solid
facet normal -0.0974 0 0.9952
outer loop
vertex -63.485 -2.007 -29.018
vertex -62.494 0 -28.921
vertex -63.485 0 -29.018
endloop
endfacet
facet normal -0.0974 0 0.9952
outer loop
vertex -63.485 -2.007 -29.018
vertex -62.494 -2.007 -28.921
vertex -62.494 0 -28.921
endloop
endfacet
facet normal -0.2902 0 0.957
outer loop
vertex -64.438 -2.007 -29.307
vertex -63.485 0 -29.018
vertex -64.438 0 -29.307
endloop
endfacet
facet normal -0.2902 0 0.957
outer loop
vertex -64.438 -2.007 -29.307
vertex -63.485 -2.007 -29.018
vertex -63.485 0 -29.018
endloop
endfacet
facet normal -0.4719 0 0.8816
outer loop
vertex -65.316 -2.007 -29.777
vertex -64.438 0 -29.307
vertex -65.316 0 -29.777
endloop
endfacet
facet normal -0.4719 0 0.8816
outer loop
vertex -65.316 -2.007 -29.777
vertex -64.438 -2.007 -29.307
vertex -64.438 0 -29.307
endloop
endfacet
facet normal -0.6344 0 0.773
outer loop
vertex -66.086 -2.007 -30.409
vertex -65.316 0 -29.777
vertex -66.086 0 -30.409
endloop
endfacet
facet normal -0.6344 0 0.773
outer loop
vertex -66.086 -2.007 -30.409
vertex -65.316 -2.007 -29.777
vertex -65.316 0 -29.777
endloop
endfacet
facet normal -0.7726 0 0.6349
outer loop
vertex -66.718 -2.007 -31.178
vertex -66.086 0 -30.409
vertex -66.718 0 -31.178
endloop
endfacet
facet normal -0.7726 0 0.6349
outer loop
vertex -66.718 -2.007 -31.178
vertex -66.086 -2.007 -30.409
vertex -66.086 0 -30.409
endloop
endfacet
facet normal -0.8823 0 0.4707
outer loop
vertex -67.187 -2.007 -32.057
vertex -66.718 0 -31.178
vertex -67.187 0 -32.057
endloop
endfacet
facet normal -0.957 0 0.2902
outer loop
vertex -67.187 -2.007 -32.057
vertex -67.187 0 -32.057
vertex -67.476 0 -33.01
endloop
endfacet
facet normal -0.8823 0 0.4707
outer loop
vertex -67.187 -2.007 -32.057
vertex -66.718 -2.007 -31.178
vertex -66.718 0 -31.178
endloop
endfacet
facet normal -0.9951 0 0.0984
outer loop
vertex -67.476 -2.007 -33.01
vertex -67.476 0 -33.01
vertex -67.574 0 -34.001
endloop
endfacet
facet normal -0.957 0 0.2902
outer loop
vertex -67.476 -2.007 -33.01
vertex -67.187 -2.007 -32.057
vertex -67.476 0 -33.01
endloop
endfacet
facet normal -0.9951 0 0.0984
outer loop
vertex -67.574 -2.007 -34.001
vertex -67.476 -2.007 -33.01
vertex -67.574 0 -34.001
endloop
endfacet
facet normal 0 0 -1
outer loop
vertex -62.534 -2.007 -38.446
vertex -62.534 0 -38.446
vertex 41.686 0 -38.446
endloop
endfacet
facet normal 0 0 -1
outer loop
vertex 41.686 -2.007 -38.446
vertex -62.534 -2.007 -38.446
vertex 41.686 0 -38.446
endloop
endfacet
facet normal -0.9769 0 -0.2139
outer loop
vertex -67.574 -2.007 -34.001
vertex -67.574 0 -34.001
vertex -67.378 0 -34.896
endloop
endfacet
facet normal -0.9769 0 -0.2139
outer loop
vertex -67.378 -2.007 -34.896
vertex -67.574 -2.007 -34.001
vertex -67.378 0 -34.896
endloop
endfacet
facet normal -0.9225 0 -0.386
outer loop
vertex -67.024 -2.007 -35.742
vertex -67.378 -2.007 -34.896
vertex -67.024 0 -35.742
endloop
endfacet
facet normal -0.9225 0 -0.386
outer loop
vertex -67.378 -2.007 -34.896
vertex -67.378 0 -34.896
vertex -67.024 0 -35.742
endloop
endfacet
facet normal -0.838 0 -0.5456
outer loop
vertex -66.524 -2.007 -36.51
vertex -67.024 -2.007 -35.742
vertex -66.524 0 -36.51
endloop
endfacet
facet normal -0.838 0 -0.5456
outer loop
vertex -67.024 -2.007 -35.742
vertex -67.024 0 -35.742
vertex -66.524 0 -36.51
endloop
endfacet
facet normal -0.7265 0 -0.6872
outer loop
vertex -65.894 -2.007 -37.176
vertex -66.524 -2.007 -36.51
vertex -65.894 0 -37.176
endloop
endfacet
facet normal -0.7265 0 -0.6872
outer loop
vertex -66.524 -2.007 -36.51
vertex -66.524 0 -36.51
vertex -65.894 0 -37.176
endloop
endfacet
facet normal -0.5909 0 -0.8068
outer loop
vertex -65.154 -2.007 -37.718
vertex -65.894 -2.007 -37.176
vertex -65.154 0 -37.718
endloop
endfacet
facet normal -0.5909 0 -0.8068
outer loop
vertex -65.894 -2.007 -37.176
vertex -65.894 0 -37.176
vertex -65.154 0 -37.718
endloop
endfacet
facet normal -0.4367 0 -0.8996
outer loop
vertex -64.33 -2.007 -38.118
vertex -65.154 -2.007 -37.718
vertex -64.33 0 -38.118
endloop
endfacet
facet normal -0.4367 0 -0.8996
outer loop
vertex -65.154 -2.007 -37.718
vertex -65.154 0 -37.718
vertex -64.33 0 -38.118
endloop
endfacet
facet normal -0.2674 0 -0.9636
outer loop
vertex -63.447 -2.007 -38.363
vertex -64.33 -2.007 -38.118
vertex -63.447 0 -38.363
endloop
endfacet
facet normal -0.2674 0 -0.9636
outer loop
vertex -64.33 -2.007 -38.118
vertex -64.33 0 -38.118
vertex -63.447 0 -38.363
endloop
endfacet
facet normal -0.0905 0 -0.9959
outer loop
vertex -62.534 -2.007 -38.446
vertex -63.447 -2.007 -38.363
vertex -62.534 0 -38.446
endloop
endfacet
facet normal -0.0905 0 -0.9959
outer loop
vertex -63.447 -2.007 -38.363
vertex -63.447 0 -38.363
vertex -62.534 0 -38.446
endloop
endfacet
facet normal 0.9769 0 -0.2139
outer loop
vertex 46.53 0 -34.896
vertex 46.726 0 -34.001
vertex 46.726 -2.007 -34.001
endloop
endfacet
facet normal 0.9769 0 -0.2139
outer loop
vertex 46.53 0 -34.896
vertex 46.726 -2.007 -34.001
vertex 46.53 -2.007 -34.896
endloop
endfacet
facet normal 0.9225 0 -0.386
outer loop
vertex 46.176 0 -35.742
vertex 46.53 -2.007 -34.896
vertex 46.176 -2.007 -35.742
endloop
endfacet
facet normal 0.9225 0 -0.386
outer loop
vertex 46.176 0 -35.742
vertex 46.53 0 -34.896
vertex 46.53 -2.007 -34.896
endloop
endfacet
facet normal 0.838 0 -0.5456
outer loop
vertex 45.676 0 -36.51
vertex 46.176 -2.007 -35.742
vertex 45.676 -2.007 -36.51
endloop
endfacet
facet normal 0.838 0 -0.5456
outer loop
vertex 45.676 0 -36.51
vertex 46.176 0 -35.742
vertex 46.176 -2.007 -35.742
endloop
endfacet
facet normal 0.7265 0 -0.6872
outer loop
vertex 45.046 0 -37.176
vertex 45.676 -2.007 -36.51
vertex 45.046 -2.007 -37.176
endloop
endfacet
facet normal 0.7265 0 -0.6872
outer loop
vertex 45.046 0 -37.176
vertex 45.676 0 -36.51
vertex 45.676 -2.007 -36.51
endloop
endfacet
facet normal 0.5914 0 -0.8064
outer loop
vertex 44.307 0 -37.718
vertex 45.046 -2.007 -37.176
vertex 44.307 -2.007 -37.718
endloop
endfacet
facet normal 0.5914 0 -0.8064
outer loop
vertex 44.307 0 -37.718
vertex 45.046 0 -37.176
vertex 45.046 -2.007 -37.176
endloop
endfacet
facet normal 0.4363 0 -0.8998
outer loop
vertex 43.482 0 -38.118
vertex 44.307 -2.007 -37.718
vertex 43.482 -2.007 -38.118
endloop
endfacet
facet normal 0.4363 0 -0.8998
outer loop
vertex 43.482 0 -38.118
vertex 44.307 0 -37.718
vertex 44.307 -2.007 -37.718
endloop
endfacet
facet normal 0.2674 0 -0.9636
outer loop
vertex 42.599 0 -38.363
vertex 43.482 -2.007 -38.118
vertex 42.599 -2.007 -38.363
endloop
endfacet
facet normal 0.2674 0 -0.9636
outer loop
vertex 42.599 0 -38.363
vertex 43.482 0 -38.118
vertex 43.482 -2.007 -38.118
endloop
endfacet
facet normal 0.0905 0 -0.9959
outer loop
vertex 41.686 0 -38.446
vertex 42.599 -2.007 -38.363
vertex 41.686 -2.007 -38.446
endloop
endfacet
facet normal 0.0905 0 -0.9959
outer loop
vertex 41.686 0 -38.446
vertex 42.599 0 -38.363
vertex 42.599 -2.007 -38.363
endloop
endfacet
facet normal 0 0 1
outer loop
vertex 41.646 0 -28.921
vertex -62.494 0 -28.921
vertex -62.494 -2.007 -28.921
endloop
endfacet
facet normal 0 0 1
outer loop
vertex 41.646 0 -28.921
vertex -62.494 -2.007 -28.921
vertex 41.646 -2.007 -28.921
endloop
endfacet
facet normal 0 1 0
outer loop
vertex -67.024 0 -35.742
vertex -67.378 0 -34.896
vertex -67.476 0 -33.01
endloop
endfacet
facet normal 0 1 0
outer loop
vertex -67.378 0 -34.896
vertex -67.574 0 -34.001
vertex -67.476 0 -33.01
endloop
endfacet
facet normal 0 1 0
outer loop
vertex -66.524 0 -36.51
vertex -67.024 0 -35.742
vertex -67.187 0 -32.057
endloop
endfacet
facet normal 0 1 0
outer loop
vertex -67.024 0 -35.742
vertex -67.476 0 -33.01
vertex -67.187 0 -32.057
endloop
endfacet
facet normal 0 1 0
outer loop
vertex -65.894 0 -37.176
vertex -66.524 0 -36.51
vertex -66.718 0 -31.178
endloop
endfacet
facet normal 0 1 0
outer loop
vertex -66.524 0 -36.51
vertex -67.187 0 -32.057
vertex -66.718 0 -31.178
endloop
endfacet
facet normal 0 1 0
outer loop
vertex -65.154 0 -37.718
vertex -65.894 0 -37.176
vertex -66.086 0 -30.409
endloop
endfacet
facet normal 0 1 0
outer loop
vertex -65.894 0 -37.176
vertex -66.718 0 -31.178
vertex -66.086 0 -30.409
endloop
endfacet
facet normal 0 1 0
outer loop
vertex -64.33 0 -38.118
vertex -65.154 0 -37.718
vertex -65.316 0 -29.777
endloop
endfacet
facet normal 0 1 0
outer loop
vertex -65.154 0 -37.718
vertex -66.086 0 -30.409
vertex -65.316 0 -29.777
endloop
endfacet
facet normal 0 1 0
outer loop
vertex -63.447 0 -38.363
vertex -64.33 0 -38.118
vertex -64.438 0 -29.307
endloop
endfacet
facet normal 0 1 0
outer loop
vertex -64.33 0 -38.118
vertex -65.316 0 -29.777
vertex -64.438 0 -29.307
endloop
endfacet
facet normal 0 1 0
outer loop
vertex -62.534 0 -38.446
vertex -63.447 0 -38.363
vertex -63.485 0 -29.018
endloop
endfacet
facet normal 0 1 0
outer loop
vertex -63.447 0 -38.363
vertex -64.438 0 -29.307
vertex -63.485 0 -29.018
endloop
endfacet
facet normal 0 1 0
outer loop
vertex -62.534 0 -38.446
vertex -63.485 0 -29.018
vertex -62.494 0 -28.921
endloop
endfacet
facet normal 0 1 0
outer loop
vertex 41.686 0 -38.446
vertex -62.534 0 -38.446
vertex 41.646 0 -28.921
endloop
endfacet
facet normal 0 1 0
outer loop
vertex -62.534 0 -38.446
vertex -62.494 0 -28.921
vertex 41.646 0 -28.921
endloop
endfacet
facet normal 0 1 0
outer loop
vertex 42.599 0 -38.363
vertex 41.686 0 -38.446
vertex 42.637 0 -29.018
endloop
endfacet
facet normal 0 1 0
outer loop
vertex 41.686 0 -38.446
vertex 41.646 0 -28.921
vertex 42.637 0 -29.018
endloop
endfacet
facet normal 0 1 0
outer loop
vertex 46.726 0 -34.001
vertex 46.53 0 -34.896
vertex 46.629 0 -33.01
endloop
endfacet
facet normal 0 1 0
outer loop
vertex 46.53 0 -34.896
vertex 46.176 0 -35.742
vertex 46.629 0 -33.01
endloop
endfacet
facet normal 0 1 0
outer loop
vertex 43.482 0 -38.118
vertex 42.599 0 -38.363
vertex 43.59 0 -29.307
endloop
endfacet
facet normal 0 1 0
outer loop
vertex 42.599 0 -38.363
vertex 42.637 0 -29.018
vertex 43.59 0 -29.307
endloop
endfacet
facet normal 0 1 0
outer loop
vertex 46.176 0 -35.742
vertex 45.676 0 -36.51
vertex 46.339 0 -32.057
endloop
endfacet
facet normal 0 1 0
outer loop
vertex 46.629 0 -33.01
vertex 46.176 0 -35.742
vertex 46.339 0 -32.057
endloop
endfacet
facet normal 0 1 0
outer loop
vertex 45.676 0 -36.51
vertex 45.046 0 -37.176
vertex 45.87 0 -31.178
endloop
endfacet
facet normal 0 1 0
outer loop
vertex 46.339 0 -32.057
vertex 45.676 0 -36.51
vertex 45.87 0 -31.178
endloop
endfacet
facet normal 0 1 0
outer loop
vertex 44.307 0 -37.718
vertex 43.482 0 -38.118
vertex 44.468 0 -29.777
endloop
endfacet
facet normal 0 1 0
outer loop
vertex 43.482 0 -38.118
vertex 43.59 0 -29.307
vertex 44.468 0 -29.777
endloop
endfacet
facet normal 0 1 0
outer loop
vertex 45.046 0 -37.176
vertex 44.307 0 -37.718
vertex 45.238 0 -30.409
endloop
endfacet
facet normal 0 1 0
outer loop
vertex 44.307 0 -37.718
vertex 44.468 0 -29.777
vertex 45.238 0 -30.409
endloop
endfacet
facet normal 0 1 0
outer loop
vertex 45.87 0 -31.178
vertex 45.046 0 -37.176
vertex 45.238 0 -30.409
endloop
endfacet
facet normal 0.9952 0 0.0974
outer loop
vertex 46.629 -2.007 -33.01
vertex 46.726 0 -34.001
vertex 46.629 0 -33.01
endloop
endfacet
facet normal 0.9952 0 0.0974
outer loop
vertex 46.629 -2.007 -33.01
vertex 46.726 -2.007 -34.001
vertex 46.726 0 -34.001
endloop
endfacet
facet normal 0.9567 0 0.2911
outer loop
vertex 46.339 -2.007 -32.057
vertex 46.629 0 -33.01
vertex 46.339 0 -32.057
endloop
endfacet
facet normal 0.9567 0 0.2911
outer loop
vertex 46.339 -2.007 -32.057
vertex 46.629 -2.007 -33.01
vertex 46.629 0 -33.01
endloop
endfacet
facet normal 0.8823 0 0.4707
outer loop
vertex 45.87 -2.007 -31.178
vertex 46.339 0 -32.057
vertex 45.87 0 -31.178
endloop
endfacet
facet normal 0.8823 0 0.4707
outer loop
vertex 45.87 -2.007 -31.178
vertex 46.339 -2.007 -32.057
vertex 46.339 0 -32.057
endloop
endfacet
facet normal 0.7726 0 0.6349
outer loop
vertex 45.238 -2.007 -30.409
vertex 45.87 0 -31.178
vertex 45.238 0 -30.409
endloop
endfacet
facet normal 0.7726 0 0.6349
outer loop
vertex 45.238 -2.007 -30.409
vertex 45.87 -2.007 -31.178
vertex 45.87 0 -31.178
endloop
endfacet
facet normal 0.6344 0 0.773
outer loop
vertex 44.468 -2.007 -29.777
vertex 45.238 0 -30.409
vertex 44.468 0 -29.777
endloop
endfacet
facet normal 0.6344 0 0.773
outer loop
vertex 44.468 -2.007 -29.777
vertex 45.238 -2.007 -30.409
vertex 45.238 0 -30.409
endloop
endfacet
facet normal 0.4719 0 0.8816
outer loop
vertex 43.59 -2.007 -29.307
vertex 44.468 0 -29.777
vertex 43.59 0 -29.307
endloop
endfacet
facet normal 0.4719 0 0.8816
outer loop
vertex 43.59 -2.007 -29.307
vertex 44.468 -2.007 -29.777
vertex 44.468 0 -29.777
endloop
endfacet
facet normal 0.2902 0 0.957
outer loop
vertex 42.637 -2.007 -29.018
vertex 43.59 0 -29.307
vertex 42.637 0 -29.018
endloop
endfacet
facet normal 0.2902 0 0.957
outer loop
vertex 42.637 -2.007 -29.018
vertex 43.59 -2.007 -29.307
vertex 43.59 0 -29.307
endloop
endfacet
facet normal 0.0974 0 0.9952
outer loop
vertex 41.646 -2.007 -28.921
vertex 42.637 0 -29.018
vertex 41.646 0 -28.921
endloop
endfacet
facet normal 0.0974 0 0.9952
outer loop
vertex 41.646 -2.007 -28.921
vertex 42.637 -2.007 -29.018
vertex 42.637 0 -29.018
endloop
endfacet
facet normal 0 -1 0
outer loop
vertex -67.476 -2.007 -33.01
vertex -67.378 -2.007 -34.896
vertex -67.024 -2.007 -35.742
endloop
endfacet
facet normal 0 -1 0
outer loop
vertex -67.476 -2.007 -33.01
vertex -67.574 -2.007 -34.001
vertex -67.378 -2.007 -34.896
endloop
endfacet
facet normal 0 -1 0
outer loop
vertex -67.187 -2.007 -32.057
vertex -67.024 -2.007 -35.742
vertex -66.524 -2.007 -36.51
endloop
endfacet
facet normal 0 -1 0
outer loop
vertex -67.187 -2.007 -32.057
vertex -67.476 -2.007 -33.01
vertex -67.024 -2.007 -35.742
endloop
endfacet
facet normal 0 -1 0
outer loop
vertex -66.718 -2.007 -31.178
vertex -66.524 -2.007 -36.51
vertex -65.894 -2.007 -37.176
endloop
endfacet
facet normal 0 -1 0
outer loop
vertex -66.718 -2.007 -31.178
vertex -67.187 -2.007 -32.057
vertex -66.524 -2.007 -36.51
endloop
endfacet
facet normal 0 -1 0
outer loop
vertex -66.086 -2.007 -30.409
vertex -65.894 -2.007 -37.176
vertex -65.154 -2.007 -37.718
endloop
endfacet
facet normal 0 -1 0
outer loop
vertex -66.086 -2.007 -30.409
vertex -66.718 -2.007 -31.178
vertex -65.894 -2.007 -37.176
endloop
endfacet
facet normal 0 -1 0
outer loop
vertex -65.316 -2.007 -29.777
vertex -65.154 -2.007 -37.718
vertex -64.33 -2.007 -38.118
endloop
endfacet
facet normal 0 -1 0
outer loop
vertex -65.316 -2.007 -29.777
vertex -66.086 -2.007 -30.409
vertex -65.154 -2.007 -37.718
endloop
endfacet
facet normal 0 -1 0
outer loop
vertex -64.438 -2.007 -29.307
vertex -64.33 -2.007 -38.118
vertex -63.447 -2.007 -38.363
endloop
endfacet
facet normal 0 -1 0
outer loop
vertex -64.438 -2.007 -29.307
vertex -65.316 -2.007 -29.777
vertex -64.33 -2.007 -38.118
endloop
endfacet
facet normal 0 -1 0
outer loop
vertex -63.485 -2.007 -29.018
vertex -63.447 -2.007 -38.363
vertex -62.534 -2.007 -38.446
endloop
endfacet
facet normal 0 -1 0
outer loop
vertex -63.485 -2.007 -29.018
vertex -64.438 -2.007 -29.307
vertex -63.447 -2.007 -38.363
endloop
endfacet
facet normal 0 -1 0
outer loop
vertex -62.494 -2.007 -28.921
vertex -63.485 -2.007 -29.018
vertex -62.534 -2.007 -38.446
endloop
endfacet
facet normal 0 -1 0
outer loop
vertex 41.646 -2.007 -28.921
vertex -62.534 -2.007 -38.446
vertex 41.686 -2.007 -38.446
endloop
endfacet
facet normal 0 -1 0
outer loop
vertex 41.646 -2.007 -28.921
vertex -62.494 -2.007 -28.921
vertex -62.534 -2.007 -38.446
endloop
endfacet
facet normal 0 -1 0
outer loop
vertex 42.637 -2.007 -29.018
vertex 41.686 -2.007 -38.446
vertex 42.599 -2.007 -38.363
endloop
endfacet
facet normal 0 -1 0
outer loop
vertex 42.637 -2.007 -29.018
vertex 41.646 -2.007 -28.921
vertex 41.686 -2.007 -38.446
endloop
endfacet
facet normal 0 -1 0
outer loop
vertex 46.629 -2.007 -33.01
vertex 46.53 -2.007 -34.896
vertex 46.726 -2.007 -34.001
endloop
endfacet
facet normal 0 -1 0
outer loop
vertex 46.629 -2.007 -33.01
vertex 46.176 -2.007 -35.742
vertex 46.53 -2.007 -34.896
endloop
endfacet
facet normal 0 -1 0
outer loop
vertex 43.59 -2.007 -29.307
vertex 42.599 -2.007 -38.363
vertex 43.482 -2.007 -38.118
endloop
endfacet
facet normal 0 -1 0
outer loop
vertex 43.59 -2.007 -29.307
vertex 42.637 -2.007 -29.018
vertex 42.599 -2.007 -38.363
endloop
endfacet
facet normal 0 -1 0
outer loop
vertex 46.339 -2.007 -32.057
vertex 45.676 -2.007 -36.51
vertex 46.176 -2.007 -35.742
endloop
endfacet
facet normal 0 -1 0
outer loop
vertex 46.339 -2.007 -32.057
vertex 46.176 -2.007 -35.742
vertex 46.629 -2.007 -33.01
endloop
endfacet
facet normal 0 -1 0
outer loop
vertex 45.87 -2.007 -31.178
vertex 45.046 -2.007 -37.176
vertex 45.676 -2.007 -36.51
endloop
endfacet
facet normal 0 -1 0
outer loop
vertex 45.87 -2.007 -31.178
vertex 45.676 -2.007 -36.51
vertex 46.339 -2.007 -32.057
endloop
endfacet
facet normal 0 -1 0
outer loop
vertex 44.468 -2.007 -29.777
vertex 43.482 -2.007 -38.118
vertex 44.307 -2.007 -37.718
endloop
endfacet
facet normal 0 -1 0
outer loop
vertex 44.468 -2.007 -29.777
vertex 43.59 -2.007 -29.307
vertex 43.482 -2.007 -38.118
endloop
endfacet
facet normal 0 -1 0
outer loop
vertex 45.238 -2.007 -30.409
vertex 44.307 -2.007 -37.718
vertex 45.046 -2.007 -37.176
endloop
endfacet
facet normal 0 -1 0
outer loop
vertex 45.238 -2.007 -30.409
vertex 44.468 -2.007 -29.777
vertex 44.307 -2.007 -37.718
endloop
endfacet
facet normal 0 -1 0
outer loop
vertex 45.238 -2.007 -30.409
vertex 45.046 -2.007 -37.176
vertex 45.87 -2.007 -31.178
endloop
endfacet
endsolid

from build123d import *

# Parameters (mm, degrees)
F0_W        = 114.3
F0_H        = 9.525
F1_DEPTH    = 2.0066
F2_R        = 5.08
F3_T1_DEPTH = 27.2073812379
F4_R        = 5.08
F5_T1_DEPTH = 27.2073812379


# Not quite as in the source:
# - a fillet or chamfer that OpenCascade refuses, or shapes differently, is made with other operations: its cross-section is extruded or revolved along the edge and cut away or added


with BuildPart() as f1:
    # F0 (on Front) → F1 (new body)
    with BuildSketch(Plane.XZ):
        with Locations((-10.4238372296, -33.6832711485)):
            Rectangle(F0_W, F0_H)
    extrude(amount=F1_DEPTH)

    # F2
    f2_edges = [f1.edges().sort_by_distance(p)[0] for p in [
        (46.726163, -1.0033, -28.920771),
    ]]
    fillet(f2_edges, radius=F2_R)

    # F3: fillet of radius 5.08 on 1 edges, made by hand

    # F3_s2 → F3_t1 (cut)
    with BuildSketch(Plane.XZ.offset(-12.6003906189)):
        with BuildLine():
            ThreePointArc((46.7261627704, -34.0007711485), (45.0461106879, -37.1757711485), (41.6860065228, -38.4457711485))
            Line((41.6860065228, -38.4457711485), (46.7261627704, -38.4457711485))
            Line((46.7261627704, -38.4457711485), (46.7261627704, -34.0007711485))
        make_face()
    extrude(amount=F3_T1_DEPTH, mode=Mode.SUBTRACT)

    # F4
    f4_edges = [f1.edges().sort_by_distance(p)[0] for p in [
        (-67.573837, -1.0033, -28.920771),
    ]]
    fillet(f4_edges, radius=F4_R)

    # F5: fillet of radius 5.08 on 1 edges, made by hand

    # F5_s2 → F5_t1 (cut)
    with BuildSketch(Plane.XZ.offset(-12.6003906189)):
        with BuildLine():
            ThreePointArc((-67.5738372296, -34.0007711485), (-65.8937851471, -37.1757711485), (-62.533680982, -38.4457711485))
            Line((-62.533680982, -38.4457711485), (-67.5738372296, -38.4457711485))
            Line((-67.5738372296, -38.4457711485), (-67.5738372296, -34.0007711485))
        make_face()
    extrude(amount=F5_T1_DEPTH, mode=Mode.SUBTRACT)


solid = f1.part
